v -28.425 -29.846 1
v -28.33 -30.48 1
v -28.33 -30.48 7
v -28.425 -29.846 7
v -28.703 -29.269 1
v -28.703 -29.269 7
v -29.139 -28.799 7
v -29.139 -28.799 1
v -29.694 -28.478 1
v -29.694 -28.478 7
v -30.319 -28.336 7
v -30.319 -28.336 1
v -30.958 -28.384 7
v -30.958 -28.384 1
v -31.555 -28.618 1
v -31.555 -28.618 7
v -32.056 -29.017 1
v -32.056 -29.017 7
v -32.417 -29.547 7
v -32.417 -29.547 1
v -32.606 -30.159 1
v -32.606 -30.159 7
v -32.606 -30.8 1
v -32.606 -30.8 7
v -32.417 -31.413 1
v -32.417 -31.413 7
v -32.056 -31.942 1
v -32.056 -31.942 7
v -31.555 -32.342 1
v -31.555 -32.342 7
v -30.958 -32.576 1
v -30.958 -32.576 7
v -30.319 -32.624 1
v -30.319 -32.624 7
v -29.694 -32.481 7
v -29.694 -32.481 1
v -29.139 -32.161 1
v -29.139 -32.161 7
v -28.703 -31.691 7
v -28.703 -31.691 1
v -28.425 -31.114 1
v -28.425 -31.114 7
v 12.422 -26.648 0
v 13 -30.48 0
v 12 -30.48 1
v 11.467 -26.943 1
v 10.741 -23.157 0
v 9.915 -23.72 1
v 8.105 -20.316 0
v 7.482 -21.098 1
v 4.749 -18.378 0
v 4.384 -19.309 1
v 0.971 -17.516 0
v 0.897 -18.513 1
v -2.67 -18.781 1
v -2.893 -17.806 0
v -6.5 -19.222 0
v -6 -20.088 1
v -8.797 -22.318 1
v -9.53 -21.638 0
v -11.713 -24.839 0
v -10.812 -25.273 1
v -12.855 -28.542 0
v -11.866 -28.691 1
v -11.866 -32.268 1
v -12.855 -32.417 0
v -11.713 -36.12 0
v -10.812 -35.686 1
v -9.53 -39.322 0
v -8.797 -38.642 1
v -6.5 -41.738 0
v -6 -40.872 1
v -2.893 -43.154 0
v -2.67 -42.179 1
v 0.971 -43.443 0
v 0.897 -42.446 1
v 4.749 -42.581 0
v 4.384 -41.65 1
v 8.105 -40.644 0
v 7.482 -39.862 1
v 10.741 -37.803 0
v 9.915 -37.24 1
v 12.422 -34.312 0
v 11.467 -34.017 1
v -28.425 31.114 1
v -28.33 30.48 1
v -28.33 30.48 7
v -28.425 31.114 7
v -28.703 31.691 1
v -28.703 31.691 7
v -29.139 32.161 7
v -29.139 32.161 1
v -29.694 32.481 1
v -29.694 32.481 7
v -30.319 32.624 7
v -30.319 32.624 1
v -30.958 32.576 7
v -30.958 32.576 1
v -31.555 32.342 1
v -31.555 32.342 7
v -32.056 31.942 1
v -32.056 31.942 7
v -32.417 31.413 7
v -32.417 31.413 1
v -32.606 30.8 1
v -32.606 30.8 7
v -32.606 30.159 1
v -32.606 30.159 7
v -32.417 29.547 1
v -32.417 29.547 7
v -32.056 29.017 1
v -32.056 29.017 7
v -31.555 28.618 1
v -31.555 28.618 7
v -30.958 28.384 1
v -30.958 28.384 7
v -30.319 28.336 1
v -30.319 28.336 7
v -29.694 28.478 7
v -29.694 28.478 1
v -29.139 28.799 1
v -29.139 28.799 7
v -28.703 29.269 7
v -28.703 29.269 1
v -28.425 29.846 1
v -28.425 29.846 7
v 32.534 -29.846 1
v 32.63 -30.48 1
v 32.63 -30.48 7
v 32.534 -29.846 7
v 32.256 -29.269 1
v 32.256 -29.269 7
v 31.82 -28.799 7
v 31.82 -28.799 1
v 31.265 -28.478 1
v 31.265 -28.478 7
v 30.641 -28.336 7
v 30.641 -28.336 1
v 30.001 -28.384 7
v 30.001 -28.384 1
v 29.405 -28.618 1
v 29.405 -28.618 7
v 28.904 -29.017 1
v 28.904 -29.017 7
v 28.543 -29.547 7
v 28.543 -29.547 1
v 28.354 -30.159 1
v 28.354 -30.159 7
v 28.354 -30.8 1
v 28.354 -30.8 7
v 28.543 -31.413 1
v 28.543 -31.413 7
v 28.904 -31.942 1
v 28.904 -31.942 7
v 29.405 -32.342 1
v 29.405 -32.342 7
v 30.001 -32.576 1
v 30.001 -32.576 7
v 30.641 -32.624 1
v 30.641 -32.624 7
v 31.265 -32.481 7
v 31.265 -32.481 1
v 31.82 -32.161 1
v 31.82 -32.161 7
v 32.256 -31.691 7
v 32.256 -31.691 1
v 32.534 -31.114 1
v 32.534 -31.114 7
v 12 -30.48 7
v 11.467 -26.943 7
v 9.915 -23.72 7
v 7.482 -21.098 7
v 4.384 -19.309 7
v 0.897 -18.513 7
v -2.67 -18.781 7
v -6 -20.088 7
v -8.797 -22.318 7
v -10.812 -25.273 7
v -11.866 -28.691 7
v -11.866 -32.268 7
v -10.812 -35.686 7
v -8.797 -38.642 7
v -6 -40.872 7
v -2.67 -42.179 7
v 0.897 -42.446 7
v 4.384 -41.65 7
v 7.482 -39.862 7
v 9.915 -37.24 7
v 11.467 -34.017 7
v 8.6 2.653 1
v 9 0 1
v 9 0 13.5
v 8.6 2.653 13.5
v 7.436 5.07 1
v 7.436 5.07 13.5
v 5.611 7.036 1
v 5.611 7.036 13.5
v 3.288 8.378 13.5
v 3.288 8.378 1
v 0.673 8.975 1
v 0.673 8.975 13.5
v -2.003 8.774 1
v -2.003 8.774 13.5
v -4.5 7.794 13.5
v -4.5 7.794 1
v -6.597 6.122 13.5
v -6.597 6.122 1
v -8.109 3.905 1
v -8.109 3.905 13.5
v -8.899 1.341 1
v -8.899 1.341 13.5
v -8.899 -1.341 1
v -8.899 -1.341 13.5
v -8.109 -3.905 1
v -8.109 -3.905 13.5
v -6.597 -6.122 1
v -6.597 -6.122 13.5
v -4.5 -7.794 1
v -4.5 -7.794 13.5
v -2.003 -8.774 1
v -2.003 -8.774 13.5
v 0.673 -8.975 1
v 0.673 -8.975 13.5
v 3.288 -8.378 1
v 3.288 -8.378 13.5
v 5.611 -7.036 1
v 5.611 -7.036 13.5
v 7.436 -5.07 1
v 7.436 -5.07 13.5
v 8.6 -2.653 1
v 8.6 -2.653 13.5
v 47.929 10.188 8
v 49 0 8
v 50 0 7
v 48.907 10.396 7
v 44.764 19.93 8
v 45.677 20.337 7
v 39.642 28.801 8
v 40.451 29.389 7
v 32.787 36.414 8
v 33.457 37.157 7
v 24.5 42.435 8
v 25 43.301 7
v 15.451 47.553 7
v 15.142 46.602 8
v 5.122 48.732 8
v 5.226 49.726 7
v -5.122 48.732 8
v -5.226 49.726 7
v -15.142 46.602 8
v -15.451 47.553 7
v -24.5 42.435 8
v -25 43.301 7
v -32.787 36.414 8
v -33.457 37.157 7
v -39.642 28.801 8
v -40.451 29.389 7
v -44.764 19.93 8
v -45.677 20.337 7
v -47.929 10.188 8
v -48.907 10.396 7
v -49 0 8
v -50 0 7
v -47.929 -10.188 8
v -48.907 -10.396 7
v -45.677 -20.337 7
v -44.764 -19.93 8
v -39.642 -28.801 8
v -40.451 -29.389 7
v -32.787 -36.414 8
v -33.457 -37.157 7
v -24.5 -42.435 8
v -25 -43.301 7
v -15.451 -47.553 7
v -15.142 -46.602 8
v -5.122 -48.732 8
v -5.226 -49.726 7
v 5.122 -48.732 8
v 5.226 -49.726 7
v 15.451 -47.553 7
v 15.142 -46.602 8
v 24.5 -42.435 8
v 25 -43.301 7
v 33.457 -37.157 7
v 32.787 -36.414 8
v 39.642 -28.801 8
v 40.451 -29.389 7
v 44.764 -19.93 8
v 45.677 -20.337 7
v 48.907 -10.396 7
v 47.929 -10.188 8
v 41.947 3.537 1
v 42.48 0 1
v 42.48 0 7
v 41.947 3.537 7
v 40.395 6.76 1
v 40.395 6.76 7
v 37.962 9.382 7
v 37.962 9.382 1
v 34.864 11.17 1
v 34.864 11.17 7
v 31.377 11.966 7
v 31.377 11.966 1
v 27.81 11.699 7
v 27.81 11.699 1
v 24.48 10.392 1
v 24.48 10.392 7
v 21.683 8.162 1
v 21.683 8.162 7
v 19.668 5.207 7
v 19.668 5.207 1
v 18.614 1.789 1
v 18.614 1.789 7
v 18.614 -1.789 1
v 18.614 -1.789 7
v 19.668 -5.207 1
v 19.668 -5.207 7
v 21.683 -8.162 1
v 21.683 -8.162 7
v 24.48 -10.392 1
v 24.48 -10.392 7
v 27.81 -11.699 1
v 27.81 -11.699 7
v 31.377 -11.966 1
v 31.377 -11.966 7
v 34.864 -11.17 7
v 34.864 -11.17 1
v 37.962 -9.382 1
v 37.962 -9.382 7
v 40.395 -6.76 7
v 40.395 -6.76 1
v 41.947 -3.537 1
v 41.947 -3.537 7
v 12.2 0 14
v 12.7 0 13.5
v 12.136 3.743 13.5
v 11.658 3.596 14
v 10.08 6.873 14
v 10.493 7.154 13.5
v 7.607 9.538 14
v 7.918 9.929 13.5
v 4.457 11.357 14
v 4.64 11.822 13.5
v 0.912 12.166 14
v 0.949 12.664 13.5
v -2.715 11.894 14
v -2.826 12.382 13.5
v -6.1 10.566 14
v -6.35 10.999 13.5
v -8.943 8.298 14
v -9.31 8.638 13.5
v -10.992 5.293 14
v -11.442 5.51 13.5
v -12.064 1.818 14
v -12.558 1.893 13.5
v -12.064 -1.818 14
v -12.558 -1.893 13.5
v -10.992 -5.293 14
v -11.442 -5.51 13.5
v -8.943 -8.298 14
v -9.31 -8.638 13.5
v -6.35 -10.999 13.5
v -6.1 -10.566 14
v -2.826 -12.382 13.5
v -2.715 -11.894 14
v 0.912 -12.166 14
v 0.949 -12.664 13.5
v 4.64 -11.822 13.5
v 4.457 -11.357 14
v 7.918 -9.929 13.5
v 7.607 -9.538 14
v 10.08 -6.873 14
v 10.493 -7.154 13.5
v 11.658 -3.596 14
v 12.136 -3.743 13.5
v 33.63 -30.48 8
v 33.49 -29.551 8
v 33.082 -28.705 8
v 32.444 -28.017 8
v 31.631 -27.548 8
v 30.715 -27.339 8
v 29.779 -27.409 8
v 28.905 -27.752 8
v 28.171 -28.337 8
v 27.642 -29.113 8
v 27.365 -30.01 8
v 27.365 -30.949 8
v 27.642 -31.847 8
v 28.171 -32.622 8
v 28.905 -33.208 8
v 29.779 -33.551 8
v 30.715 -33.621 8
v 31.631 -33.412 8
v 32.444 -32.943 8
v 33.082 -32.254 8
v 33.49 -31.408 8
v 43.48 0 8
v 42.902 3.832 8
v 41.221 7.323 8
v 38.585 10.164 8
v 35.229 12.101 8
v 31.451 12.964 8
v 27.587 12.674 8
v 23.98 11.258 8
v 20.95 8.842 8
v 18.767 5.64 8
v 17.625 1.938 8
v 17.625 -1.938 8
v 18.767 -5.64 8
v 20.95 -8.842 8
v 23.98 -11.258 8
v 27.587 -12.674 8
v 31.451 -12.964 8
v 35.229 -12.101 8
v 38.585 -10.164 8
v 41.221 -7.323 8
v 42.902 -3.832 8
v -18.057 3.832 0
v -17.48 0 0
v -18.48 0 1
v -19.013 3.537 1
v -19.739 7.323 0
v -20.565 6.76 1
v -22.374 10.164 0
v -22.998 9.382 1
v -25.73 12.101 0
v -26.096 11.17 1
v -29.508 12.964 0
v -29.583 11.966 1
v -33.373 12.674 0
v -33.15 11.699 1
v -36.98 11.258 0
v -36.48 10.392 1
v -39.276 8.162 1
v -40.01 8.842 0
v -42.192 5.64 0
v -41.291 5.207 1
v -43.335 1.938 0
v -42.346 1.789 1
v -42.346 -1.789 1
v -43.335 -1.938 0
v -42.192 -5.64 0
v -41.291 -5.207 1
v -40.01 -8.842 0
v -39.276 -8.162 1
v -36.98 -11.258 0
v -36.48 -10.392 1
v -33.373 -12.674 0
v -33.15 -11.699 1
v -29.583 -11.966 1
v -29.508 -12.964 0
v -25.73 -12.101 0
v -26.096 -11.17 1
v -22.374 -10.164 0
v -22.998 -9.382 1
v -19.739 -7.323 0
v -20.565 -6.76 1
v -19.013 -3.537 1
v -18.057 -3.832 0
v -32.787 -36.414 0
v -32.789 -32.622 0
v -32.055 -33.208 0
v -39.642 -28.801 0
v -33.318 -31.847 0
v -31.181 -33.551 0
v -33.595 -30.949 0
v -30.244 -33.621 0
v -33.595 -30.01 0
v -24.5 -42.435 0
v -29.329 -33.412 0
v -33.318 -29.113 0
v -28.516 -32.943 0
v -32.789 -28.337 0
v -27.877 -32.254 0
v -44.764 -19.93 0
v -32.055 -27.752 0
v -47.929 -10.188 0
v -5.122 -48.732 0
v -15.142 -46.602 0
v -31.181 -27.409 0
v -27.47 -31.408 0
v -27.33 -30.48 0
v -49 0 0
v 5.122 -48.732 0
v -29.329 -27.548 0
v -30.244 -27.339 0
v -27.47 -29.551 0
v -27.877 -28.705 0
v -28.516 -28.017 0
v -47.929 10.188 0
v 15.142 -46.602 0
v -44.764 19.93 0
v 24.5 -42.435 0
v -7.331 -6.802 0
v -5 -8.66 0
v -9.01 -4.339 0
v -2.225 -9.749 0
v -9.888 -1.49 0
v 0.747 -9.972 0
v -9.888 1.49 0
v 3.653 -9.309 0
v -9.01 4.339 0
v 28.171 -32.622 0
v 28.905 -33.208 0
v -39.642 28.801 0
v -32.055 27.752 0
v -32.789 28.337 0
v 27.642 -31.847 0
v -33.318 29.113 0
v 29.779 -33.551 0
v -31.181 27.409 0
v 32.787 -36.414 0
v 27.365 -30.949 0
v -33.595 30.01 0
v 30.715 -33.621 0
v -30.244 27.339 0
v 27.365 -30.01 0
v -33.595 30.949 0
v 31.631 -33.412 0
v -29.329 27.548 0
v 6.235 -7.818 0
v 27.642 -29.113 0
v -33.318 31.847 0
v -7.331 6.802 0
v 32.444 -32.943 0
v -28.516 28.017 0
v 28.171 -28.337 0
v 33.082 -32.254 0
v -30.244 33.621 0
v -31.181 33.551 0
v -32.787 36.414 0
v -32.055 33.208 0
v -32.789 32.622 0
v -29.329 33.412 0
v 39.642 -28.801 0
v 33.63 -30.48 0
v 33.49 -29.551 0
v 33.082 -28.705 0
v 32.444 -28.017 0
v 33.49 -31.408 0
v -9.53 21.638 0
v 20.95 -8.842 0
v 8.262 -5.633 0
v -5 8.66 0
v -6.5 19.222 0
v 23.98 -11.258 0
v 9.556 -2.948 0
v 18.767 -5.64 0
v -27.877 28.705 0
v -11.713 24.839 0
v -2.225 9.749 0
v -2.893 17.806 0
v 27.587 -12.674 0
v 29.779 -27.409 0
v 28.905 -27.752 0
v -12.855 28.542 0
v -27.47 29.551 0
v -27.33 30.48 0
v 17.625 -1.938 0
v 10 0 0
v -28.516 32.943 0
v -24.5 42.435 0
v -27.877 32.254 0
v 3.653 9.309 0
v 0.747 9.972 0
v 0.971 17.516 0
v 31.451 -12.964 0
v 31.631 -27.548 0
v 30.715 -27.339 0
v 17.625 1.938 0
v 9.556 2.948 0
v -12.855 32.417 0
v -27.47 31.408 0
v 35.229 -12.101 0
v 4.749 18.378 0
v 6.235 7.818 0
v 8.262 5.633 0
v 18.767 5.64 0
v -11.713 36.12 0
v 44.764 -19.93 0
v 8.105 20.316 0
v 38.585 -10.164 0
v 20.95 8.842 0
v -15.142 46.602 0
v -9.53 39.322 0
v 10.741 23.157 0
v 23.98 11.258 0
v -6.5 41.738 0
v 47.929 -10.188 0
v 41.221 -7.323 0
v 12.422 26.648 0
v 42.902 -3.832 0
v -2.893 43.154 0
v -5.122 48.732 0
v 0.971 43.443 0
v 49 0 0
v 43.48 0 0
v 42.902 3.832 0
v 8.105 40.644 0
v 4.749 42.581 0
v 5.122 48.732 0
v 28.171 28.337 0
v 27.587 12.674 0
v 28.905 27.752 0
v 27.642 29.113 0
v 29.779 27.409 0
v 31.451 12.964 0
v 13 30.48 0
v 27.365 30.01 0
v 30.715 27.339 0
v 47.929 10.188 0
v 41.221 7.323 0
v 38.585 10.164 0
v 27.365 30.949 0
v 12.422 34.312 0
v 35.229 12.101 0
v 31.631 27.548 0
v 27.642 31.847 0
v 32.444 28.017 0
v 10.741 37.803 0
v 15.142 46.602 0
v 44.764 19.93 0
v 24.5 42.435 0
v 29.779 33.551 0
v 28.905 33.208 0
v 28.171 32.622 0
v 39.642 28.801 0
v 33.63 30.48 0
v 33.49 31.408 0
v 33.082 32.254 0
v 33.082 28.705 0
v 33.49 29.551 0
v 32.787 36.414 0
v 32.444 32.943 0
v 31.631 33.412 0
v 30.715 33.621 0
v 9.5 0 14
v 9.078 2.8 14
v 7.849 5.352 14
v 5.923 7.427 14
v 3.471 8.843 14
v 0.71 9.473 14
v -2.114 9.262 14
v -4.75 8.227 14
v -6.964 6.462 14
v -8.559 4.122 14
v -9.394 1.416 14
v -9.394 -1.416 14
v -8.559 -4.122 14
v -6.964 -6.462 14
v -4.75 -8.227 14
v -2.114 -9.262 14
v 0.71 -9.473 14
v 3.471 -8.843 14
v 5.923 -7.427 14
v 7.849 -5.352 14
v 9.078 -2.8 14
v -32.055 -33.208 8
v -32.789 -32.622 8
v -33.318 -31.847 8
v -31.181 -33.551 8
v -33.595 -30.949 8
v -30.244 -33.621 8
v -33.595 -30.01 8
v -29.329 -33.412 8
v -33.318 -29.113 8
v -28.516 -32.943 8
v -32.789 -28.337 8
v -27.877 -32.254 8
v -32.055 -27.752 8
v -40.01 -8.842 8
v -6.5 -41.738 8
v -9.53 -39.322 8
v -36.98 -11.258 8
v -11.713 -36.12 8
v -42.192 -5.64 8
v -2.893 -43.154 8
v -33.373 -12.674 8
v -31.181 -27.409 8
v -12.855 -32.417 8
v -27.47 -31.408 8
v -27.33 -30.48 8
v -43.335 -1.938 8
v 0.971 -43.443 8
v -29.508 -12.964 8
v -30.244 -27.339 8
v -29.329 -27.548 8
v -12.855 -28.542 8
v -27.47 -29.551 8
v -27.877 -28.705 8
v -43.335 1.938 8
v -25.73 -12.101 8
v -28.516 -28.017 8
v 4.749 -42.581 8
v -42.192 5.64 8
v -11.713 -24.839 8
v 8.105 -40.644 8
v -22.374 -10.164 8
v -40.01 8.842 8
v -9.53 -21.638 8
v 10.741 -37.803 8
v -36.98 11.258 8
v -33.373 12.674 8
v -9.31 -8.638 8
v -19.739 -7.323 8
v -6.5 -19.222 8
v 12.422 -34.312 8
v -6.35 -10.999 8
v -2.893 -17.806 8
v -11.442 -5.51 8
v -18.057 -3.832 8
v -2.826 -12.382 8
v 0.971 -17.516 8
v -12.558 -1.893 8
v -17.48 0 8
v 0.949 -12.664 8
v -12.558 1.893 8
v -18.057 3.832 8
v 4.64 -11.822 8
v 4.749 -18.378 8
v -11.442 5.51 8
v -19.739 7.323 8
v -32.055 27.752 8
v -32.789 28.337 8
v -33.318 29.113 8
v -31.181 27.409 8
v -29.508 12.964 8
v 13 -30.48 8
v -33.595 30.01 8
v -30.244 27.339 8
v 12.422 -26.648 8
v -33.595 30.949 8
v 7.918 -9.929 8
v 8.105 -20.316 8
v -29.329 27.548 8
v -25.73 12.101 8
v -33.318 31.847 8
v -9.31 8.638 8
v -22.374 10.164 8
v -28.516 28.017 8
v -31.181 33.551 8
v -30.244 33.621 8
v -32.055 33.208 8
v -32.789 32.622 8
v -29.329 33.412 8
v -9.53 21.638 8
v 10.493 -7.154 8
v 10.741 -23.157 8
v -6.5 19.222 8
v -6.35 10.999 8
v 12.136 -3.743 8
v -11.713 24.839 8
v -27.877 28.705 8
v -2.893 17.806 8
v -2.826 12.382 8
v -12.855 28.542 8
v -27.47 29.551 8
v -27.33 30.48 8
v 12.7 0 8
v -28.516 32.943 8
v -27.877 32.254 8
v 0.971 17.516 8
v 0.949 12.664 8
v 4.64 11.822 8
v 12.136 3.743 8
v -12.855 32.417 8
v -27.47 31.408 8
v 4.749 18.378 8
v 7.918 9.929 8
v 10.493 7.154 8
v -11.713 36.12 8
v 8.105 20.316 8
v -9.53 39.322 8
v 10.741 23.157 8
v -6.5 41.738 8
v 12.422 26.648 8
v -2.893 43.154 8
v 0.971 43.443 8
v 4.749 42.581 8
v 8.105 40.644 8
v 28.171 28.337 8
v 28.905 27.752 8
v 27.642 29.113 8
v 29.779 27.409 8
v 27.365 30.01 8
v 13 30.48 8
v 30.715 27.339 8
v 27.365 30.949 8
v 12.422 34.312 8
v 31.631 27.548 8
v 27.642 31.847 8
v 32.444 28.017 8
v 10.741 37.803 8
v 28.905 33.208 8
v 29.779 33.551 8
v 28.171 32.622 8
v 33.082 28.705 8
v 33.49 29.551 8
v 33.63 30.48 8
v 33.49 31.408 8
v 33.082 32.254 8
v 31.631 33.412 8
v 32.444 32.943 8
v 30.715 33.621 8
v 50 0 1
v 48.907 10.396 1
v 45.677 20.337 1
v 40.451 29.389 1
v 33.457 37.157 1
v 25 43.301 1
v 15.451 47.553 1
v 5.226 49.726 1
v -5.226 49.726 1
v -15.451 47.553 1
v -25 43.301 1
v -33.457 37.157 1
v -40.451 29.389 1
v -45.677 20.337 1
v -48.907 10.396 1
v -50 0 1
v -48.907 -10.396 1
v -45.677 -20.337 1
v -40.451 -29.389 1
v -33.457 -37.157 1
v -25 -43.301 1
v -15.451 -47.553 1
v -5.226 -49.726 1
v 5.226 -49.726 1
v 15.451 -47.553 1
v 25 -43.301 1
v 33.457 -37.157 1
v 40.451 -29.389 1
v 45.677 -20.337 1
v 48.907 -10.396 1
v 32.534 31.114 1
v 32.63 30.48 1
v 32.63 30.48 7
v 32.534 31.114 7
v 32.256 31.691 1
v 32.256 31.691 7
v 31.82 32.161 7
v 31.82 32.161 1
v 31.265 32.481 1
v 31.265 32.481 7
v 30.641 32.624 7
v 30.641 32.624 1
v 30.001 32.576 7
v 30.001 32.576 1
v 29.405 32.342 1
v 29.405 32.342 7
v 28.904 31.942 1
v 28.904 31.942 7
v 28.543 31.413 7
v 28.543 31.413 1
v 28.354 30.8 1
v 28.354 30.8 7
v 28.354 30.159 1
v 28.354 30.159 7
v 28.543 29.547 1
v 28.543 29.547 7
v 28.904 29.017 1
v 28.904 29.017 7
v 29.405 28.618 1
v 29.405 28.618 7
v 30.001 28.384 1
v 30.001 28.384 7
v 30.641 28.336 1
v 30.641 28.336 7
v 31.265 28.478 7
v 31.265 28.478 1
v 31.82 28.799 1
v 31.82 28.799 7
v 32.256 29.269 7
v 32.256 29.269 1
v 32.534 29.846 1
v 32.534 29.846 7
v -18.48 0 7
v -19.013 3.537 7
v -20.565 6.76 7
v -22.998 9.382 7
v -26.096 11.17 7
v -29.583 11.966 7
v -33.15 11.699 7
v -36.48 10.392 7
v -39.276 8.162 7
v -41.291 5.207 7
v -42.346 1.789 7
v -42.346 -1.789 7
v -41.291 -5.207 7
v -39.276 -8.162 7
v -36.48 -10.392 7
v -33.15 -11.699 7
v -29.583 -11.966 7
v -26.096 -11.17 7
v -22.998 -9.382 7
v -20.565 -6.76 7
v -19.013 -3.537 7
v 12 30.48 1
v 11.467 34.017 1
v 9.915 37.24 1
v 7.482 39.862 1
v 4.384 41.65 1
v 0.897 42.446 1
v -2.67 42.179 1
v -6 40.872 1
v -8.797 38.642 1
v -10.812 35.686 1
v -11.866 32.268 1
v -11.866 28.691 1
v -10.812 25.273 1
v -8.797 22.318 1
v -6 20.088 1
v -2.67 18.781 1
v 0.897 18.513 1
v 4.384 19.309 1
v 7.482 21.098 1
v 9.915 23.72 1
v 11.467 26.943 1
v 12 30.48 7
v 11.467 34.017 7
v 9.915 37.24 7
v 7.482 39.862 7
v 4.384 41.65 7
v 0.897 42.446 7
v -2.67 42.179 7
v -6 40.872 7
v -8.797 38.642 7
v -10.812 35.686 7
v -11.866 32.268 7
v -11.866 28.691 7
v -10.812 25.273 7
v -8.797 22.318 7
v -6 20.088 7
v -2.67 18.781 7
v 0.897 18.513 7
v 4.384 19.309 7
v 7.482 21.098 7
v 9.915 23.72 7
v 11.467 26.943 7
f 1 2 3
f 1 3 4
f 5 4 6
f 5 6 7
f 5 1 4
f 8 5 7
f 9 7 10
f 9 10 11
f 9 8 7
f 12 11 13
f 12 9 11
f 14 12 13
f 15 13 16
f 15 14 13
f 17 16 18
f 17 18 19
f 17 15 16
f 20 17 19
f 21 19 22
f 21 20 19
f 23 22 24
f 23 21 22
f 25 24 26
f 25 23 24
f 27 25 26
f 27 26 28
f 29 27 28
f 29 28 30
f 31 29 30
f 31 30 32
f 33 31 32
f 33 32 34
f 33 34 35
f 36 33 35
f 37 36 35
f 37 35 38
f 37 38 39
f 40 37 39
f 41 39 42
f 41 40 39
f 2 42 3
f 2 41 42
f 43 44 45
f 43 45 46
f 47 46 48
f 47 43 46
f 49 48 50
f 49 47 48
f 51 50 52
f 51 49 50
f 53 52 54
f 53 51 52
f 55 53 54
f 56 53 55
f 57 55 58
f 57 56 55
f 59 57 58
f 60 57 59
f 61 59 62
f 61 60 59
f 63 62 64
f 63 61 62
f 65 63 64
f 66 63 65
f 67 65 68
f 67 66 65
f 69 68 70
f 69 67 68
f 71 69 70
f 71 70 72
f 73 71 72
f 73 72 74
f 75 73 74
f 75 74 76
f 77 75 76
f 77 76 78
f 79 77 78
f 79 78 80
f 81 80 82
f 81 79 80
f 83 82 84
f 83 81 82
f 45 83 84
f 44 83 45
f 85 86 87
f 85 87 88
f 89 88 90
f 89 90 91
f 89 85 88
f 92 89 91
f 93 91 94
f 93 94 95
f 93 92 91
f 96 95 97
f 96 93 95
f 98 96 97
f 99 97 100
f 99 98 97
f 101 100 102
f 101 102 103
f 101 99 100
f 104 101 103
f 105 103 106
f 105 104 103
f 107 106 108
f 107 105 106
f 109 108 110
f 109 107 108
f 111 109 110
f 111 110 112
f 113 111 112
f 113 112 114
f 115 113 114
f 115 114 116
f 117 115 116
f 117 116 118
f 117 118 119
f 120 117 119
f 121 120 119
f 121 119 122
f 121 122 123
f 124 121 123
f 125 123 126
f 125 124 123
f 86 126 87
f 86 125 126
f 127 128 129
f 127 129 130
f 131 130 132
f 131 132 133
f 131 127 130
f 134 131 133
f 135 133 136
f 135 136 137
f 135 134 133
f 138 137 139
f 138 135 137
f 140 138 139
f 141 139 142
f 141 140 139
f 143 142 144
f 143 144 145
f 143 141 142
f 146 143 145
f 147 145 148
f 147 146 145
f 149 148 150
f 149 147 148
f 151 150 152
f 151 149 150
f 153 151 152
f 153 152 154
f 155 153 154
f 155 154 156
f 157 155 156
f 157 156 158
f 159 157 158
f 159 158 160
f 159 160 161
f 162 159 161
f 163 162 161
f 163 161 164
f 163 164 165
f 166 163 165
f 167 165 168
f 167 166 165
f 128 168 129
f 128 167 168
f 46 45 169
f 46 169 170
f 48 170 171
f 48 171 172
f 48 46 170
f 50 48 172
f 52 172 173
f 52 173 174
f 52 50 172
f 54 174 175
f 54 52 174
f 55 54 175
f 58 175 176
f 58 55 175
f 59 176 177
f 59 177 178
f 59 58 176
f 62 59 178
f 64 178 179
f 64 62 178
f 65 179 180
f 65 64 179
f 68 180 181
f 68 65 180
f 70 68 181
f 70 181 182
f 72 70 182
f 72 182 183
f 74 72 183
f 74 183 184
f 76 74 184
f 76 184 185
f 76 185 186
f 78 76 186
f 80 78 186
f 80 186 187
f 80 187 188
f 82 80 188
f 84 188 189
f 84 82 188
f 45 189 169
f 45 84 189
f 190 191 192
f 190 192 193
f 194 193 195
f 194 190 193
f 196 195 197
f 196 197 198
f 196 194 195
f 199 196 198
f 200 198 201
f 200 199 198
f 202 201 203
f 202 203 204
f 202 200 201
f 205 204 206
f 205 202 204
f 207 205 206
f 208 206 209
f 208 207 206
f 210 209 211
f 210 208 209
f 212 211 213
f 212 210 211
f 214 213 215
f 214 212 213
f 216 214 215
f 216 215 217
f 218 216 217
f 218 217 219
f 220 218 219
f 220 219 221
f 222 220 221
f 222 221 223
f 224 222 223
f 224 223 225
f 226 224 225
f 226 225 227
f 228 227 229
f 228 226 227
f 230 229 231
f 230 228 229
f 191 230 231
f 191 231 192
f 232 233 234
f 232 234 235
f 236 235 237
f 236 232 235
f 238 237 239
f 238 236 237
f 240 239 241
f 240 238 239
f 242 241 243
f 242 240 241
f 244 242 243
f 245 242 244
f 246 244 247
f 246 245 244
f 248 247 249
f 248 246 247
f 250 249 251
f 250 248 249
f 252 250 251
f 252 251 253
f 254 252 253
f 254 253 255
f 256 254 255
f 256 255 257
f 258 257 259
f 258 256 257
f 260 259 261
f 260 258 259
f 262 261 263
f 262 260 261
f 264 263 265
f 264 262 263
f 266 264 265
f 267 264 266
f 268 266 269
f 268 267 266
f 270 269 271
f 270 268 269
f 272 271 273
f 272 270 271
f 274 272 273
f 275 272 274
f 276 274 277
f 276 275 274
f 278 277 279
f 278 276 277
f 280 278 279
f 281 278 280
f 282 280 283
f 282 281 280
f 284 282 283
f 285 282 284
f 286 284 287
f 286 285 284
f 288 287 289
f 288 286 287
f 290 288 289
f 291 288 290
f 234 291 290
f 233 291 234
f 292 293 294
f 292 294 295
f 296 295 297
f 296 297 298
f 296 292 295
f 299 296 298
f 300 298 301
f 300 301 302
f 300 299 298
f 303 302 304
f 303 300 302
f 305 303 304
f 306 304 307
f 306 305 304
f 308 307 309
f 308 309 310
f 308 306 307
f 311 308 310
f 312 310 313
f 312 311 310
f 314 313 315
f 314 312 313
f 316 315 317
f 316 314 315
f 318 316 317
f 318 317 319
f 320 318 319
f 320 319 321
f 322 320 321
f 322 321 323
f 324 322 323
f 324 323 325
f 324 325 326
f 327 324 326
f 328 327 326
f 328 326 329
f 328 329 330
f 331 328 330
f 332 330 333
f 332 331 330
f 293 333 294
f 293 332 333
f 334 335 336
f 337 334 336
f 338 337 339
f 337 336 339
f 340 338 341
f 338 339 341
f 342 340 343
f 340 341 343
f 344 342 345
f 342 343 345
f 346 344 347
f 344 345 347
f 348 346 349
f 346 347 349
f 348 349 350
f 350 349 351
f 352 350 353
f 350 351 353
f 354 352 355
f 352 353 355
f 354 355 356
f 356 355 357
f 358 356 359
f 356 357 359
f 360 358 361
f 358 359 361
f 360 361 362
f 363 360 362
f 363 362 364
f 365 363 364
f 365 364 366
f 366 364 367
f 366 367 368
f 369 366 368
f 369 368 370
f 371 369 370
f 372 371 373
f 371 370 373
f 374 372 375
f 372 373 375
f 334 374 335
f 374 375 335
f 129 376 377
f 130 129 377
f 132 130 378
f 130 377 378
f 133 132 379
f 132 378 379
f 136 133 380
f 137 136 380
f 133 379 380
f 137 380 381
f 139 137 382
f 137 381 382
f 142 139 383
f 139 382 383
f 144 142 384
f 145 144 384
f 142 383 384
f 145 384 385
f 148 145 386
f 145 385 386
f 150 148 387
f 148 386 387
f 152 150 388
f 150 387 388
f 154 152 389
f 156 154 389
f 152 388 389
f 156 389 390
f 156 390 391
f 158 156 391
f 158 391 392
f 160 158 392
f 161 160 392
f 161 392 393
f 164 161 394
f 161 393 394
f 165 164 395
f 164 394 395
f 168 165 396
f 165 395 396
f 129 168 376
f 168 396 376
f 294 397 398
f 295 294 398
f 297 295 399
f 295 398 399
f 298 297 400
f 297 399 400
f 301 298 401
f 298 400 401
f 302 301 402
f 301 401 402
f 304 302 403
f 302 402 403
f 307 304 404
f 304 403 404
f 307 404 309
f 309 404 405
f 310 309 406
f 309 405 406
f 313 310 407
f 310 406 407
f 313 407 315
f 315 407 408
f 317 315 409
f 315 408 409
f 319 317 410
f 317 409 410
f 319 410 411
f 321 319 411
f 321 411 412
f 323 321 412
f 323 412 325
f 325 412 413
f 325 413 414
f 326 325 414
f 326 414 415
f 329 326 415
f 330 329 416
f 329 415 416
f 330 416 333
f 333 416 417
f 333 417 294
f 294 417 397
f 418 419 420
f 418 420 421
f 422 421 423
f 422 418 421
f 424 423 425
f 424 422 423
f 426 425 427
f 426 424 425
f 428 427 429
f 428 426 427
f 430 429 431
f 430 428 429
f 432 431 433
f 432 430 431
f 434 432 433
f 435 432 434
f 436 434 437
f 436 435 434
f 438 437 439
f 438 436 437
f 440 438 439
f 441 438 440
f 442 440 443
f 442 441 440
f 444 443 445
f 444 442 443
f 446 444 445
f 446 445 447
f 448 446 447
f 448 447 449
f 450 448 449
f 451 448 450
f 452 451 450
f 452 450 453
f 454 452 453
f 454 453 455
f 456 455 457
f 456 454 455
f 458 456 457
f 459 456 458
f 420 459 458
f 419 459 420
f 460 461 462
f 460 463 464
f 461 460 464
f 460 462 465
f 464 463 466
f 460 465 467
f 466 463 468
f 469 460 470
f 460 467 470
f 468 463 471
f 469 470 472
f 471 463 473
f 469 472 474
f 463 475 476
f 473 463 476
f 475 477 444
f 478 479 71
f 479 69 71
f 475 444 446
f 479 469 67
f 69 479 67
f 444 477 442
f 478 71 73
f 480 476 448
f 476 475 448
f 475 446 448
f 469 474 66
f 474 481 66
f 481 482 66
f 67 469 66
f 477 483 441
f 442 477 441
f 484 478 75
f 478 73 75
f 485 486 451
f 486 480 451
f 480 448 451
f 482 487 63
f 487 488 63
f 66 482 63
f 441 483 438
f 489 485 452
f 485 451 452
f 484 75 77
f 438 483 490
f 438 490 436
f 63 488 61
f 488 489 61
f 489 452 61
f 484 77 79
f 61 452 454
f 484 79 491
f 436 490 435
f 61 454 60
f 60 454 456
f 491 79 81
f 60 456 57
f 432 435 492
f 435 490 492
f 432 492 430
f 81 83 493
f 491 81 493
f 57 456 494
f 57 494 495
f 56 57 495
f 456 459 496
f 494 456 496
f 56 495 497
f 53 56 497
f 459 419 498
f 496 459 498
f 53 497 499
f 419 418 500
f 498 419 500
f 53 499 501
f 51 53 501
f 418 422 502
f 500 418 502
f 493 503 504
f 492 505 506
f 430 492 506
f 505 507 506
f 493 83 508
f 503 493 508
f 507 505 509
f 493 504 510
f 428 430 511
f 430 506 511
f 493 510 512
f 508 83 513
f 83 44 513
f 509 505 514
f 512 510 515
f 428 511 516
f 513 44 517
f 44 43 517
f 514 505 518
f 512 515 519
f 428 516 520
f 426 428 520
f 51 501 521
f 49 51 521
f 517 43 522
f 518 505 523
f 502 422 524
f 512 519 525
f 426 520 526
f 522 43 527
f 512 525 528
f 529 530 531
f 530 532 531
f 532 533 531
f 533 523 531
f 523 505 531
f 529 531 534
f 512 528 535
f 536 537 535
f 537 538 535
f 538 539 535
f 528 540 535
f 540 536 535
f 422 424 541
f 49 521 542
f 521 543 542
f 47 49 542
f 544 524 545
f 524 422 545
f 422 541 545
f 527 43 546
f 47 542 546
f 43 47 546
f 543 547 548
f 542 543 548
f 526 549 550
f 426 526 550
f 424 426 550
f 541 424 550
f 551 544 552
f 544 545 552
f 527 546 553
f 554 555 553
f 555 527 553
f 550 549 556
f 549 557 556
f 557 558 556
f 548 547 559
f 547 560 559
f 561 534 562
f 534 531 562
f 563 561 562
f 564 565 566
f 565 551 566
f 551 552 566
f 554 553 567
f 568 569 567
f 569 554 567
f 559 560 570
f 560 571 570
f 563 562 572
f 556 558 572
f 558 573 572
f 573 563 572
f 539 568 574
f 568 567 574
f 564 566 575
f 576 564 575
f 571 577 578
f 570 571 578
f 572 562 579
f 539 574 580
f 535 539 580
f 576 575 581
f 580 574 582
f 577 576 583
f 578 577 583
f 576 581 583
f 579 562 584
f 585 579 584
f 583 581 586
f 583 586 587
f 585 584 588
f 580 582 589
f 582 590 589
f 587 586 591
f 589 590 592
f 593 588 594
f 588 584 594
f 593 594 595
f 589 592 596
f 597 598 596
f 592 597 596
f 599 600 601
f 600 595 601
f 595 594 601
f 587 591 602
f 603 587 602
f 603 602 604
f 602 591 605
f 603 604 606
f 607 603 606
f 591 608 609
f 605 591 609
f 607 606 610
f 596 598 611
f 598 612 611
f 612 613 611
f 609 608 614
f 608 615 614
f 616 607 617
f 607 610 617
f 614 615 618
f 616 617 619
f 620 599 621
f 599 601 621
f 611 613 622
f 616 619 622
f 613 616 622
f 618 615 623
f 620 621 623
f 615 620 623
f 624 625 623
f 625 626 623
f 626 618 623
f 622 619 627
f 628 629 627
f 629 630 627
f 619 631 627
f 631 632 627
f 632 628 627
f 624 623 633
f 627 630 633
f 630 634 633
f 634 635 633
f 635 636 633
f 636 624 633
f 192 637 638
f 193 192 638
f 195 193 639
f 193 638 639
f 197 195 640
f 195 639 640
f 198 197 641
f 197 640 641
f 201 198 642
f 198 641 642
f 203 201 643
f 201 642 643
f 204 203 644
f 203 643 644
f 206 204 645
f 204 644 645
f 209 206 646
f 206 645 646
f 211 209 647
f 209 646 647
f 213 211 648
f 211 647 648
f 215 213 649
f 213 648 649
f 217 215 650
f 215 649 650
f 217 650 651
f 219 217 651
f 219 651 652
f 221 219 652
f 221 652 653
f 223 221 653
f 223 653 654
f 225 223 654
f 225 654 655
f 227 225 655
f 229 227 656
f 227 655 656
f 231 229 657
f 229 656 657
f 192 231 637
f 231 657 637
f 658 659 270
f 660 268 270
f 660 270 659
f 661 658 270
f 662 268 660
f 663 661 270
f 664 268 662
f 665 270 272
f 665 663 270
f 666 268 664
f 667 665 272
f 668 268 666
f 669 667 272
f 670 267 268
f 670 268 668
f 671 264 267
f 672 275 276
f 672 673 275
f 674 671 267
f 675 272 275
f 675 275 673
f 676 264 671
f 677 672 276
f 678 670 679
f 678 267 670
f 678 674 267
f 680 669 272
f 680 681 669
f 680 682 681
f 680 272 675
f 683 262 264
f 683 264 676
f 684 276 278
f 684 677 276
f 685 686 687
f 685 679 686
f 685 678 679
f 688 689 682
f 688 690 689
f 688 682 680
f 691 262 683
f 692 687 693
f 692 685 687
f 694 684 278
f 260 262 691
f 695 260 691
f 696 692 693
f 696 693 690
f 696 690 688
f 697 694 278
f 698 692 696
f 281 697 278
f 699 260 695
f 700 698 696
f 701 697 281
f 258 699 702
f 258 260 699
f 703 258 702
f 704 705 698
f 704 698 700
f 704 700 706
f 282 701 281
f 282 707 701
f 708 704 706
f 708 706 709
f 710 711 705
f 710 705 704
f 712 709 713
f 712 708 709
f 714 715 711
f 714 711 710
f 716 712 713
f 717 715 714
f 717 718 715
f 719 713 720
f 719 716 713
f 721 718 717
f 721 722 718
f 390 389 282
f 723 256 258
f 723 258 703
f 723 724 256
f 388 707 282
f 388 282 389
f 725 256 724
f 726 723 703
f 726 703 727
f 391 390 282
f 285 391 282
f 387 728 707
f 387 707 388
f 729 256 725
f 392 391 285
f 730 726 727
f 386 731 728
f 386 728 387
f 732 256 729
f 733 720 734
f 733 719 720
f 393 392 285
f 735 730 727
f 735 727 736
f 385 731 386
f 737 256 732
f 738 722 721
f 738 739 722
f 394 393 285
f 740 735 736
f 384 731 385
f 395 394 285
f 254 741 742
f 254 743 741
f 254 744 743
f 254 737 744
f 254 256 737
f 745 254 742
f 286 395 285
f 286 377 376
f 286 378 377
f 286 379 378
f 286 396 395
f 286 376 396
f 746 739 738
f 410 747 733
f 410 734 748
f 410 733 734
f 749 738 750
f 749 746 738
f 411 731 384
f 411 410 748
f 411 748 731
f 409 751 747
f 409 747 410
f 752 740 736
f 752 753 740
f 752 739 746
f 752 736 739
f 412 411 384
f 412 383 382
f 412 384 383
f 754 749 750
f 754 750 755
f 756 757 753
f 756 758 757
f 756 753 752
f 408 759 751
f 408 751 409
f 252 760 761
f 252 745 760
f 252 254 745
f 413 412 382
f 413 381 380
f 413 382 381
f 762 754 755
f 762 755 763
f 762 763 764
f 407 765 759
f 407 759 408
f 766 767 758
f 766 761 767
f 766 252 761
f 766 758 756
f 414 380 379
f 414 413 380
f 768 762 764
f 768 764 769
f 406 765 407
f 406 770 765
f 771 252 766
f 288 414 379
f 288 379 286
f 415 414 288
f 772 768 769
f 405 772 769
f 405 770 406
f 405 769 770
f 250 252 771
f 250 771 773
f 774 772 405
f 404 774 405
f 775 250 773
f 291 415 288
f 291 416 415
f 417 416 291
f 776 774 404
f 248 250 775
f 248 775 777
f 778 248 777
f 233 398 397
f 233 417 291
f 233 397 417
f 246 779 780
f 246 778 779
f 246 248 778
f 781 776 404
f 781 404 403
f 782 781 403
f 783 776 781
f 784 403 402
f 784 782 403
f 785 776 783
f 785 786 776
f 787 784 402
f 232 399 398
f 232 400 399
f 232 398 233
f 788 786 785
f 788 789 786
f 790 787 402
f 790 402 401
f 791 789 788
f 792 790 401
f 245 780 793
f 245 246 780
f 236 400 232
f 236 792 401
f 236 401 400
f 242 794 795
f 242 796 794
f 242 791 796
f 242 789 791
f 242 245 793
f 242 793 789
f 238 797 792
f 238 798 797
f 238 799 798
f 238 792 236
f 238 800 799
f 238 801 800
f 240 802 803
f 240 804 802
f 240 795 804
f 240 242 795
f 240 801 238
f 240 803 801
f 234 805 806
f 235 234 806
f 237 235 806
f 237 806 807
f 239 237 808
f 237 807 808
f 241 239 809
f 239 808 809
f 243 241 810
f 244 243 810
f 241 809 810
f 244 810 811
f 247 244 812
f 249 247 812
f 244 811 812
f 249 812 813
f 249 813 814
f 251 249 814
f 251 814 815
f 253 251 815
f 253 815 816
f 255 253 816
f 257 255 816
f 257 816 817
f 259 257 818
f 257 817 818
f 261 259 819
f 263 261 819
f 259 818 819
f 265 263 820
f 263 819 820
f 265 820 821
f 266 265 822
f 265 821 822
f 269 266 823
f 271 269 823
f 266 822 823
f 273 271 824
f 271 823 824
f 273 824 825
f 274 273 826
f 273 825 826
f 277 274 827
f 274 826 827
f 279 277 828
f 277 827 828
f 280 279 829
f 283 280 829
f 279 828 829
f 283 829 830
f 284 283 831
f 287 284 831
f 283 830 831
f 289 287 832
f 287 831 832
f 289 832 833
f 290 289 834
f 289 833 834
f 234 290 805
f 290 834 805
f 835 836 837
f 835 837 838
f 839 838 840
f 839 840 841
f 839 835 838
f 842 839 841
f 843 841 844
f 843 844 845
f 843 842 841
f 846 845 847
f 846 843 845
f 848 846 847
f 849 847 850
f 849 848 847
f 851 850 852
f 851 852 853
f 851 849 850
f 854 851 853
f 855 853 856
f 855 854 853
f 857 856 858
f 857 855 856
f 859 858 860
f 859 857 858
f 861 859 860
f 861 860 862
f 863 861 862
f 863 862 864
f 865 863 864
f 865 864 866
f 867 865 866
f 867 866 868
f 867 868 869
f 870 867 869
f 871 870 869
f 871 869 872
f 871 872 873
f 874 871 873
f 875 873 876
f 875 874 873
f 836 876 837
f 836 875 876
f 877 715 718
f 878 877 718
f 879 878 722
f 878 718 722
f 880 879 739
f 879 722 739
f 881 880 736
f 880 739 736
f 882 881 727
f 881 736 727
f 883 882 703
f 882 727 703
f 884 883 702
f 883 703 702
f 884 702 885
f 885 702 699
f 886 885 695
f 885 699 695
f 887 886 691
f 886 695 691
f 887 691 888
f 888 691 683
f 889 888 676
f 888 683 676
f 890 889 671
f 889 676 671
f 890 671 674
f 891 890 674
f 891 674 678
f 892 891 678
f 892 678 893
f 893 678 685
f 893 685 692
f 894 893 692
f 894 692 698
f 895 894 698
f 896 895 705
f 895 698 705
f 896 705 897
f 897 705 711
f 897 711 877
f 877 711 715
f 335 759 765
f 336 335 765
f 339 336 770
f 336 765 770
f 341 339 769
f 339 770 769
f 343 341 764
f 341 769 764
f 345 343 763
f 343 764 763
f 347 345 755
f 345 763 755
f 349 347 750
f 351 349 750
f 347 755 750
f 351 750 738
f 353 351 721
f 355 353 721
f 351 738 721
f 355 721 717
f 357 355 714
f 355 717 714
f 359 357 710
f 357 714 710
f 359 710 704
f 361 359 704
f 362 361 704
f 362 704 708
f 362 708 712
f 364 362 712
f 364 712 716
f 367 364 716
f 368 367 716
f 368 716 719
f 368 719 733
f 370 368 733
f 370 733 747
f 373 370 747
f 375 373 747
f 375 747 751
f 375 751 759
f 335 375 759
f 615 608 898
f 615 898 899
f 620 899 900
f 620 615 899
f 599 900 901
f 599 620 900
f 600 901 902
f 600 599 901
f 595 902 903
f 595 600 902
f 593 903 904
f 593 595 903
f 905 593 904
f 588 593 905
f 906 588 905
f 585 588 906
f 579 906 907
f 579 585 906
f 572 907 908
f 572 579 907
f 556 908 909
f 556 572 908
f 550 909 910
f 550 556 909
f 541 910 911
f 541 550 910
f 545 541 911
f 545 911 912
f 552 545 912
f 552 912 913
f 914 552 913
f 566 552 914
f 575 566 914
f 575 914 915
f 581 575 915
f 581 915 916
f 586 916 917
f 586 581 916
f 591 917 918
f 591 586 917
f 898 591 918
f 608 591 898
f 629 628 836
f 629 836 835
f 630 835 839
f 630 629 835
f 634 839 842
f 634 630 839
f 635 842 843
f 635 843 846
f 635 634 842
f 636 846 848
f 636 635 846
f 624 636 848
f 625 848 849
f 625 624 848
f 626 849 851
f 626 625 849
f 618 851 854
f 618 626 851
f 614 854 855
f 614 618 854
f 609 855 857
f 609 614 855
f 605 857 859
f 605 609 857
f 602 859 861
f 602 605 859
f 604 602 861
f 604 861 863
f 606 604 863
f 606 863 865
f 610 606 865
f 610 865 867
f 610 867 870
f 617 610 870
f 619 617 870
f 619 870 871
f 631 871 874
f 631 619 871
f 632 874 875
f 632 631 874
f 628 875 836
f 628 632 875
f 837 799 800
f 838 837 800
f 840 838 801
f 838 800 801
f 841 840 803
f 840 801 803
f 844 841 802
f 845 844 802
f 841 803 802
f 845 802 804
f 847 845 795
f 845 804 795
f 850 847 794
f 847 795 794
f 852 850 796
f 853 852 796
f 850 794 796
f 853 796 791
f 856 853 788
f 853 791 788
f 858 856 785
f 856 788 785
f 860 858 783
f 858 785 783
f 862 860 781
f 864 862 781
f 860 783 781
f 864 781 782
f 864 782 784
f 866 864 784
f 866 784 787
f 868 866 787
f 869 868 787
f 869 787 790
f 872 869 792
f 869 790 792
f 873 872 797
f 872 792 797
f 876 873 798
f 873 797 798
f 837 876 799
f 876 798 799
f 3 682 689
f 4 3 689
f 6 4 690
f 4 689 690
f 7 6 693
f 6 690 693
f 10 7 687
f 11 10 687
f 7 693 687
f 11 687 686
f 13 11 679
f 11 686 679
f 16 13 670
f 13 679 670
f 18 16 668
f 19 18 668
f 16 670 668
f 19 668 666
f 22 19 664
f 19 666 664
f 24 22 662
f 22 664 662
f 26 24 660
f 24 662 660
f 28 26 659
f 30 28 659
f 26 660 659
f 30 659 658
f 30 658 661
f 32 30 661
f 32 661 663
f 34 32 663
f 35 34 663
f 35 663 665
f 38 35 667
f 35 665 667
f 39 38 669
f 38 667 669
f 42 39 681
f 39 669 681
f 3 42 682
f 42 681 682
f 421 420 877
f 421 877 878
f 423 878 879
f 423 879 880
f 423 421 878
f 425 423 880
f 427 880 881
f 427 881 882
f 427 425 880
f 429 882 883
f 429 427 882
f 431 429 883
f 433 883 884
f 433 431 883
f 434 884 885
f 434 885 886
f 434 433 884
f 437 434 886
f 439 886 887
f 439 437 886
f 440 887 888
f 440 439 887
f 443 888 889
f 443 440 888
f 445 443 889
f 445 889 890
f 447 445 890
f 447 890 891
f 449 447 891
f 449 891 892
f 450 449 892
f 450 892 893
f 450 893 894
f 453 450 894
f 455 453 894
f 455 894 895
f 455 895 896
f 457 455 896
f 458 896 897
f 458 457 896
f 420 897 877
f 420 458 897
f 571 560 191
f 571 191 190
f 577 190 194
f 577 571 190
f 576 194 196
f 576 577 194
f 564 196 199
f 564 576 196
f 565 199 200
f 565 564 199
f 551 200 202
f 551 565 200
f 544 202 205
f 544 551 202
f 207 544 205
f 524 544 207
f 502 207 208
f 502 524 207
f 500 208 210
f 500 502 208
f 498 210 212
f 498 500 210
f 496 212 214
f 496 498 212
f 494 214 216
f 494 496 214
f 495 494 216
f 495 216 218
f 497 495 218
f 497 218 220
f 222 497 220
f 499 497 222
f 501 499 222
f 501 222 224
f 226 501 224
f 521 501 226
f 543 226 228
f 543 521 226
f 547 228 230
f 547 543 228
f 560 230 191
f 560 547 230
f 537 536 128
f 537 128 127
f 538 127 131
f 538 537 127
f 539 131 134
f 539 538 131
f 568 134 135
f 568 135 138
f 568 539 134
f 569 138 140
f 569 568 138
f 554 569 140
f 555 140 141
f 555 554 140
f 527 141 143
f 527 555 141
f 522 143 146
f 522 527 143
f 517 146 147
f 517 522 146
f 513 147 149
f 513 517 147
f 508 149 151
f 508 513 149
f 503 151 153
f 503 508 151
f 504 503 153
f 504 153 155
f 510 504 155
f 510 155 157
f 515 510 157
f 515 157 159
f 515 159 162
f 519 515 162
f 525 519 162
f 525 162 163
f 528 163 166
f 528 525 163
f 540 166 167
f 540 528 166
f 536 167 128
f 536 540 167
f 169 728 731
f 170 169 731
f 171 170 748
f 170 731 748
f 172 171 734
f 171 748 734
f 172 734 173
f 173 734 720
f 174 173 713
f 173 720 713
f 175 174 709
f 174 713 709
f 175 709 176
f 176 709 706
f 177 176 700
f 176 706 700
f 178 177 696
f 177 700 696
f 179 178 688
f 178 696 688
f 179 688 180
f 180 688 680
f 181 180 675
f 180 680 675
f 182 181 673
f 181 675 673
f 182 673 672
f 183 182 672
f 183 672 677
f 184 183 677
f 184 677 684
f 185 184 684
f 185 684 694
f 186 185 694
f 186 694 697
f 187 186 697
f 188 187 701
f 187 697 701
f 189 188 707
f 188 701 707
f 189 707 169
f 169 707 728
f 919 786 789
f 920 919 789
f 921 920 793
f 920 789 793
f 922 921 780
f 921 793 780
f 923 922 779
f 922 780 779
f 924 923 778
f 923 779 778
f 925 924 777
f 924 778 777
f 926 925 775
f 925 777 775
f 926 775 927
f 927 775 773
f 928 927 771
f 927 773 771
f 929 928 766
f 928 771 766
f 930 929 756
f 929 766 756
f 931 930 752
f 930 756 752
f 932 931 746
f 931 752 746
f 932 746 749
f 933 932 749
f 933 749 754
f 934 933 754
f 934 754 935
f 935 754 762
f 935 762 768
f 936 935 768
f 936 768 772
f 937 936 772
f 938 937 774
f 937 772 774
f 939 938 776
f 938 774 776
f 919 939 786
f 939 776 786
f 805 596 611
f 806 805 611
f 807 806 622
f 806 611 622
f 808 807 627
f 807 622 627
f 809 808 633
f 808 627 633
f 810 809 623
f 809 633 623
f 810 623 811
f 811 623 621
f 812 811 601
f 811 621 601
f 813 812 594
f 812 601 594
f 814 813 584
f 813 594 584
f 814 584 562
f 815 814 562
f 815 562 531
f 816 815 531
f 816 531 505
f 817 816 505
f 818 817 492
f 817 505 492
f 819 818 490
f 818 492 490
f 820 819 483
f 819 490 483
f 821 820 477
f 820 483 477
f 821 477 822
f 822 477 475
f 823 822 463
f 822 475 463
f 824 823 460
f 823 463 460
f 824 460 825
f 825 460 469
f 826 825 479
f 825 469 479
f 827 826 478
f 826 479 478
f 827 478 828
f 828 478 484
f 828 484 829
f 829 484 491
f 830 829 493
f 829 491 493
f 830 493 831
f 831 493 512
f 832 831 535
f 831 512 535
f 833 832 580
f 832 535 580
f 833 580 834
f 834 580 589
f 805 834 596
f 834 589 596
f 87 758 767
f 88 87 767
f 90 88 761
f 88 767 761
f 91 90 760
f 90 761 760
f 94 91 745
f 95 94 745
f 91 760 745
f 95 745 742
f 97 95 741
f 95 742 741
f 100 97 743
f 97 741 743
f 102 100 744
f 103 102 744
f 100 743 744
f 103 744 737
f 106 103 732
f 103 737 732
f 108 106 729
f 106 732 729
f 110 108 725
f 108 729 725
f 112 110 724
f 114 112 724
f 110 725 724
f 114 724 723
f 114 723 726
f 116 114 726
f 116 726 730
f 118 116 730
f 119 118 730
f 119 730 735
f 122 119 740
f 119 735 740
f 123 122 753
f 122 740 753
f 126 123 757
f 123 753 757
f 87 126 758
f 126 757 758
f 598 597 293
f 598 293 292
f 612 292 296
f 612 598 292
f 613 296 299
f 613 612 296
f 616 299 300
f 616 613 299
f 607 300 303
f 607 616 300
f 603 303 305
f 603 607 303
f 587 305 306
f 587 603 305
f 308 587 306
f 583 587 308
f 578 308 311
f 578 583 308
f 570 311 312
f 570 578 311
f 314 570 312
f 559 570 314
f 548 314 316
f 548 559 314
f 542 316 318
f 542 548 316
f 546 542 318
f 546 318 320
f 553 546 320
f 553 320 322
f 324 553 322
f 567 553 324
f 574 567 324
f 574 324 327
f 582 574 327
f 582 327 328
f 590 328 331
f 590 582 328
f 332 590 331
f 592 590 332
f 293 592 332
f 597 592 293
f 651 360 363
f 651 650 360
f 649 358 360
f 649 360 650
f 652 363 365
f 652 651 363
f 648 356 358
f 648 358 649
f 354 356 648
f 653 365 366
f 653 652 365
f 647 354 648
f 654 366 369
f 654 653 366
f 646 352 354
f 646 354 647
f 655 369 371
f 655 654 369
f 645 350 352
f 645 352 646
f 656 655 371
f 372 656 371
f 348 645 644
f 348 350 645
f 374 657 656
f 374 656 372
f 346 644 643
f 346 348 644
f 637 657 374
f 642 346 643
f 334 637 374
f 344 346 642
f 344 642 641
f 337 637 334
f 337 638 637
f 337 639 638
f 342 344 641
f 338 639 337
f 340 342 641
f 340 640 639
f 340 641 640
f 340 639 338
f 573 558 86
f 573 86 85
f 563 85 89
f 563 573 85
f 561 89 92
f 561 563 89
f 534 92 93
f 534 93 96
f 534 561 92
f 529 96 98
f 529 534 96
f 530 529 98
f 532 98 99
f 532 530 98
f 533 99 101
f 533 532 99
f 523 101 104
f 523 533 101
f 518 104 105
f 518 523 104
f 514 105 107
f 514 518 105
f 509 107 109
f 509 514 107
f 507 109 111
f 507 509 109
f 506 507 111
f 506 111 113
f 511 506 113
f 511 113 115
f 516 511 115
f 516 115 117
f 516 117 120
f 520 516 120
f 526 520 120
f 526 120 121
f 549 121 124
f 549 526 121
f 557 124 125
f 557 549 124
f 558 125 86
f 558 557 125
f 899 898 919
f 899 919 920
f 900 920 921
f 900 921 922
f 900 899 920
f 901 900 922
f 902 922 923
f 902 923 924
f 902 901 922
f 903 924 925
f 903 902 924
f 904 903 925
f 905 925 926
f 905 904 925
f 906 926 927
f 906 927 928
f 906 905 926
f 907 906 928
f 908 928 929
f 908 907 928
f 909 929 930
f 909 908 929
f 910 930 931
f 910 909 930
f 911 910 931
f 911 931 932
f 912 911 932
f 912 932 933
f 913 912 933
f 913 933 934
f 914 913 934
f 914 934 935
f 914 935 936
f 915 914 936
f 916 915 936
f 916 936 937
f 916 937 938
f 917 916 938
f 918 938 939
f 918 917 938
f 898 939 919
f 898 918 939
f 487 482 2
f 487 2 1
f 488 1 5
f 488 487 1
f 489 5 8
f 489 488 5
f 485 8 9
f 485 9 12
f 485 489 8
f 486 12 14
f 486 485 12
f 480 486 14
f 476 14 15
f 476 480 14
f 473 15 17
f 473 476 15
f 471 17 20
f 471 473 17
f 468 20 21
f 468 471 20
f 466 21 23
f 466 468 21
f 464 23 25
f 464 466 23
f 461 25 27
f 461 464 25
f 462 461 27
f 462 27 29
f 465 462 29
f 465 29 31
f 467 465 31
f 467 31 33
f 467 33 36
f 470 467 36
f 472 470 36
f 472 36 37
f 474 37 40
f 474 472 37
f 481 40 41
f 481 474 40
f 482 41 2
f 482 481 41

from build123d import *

# Parameters (mm, degrees)
SKETCH002_R     = 50
SKETCH002_R_2   = 2.15
SKETCH002_R_3   = 9
SKETCH002_R_4   = 12
PAD001_DEPTH    = 8
CHAMFER001_SIZE = 1
SKETCH003_R     = 12.7
SKETCH003_R_2   = 9
PAD002_DEPTH    = 8
CHAMFER002_SIZE = 0.5


with BuildPart() as part:
    # Sketch002 → Pad001 (new body)
    with BuildSketch(Plane.XY):
        Circle(SKETCH002_R)
        with Locations((-30.479838, 30.479838)):
            Circle(SKETCH002_R_2, mode=Mode.SUBTRACT)
        with Locations((30.479838, 30.479838)):
            Circle(SKETCH002_R_2, mode=Mode.SUBTRACT)
        with Locations((30.479838, -30.479838)):
            Circle(SKETCH002_R_2, mode=Mode.SUBTRACT)
        with Locations((-30.479838, -30.479838)):
            Circle(SKETCH002_R_2, mode=Mode.SUBTRACT)
        Circle(SKETCH002_R_3, mode=Mode.SUBTRACT)
        with Locations((-30.479838, 0)):
            Circle(SKETCH002_R_4, mode=Mode.SUBTRACT)
        with Locations((30.479838, 0)):
            Circle(SKETCH002_R_4, mode=Mode.SUBTRACT)
        with Locations((0, -30.479838)):
            Circle(SKETCH002_R_4, mode=Mode.SUBTRACT)
        with Locations((0, 30.479838)):
            Circle(SKETCH002_R_4, mode=Mode.SUBTRACT)
    extrude(amount=PAD001_DEPTH)

    # Chamfer001
    chamfer001_edges = [part.edges().sort_by_distance(p)[0] for p in [
        (-50, 0, 8),
        (-42.479838, 0, 8),
        (-12, 30.479838, 8),
        (18.479838, 0, 8),
        (-12, -30.479838, 8),
        (-9, 0, 8),
        (-32.629838, -30.479838, 8),
        (28.329838, -30.479838, 8),
        (28.329838, 30.479838, 8),
        (-32.629838, 30.479838, 8),
        (-50, 0, 0),
        (-42.479838, 0, 0),
        (-12, 30.479838, 0),
        (18.479838, 0, 0),
        (-12, -30.479838, 0),
        (-9, 0, 0),
        (-32.629838, -30.479838, 0),
        (28.329838, -30.479838, 0),
        (28.329838, 30.479838, 0),
        (-32.629838, 30.479838, 0),
    ]]
    chamfer(chamfer001_edges, length=CHAMFER001_SIZE)

    # Sketch003 (on Face12 of Pad001) → Pad002 (join)
    with BuildSketch(Plane.XY.offset(6)):
        Circle(SKETCH003_R)
        Circle(SKETCH003_R_2, mode=Mode.SUBTRACT)
    extrude(amount=PAD002_DEPTH)

    # Chamfer002
    chamfer002_edges = [part.edges().sort_by_distance(p)[0] for p in [
        (-12.7, 0, 14),
        (-9, 0, 14),
    ]]
    chamfer(chamfer002_edges, length=CHAMFER002_SIZE)


solid = part.part
